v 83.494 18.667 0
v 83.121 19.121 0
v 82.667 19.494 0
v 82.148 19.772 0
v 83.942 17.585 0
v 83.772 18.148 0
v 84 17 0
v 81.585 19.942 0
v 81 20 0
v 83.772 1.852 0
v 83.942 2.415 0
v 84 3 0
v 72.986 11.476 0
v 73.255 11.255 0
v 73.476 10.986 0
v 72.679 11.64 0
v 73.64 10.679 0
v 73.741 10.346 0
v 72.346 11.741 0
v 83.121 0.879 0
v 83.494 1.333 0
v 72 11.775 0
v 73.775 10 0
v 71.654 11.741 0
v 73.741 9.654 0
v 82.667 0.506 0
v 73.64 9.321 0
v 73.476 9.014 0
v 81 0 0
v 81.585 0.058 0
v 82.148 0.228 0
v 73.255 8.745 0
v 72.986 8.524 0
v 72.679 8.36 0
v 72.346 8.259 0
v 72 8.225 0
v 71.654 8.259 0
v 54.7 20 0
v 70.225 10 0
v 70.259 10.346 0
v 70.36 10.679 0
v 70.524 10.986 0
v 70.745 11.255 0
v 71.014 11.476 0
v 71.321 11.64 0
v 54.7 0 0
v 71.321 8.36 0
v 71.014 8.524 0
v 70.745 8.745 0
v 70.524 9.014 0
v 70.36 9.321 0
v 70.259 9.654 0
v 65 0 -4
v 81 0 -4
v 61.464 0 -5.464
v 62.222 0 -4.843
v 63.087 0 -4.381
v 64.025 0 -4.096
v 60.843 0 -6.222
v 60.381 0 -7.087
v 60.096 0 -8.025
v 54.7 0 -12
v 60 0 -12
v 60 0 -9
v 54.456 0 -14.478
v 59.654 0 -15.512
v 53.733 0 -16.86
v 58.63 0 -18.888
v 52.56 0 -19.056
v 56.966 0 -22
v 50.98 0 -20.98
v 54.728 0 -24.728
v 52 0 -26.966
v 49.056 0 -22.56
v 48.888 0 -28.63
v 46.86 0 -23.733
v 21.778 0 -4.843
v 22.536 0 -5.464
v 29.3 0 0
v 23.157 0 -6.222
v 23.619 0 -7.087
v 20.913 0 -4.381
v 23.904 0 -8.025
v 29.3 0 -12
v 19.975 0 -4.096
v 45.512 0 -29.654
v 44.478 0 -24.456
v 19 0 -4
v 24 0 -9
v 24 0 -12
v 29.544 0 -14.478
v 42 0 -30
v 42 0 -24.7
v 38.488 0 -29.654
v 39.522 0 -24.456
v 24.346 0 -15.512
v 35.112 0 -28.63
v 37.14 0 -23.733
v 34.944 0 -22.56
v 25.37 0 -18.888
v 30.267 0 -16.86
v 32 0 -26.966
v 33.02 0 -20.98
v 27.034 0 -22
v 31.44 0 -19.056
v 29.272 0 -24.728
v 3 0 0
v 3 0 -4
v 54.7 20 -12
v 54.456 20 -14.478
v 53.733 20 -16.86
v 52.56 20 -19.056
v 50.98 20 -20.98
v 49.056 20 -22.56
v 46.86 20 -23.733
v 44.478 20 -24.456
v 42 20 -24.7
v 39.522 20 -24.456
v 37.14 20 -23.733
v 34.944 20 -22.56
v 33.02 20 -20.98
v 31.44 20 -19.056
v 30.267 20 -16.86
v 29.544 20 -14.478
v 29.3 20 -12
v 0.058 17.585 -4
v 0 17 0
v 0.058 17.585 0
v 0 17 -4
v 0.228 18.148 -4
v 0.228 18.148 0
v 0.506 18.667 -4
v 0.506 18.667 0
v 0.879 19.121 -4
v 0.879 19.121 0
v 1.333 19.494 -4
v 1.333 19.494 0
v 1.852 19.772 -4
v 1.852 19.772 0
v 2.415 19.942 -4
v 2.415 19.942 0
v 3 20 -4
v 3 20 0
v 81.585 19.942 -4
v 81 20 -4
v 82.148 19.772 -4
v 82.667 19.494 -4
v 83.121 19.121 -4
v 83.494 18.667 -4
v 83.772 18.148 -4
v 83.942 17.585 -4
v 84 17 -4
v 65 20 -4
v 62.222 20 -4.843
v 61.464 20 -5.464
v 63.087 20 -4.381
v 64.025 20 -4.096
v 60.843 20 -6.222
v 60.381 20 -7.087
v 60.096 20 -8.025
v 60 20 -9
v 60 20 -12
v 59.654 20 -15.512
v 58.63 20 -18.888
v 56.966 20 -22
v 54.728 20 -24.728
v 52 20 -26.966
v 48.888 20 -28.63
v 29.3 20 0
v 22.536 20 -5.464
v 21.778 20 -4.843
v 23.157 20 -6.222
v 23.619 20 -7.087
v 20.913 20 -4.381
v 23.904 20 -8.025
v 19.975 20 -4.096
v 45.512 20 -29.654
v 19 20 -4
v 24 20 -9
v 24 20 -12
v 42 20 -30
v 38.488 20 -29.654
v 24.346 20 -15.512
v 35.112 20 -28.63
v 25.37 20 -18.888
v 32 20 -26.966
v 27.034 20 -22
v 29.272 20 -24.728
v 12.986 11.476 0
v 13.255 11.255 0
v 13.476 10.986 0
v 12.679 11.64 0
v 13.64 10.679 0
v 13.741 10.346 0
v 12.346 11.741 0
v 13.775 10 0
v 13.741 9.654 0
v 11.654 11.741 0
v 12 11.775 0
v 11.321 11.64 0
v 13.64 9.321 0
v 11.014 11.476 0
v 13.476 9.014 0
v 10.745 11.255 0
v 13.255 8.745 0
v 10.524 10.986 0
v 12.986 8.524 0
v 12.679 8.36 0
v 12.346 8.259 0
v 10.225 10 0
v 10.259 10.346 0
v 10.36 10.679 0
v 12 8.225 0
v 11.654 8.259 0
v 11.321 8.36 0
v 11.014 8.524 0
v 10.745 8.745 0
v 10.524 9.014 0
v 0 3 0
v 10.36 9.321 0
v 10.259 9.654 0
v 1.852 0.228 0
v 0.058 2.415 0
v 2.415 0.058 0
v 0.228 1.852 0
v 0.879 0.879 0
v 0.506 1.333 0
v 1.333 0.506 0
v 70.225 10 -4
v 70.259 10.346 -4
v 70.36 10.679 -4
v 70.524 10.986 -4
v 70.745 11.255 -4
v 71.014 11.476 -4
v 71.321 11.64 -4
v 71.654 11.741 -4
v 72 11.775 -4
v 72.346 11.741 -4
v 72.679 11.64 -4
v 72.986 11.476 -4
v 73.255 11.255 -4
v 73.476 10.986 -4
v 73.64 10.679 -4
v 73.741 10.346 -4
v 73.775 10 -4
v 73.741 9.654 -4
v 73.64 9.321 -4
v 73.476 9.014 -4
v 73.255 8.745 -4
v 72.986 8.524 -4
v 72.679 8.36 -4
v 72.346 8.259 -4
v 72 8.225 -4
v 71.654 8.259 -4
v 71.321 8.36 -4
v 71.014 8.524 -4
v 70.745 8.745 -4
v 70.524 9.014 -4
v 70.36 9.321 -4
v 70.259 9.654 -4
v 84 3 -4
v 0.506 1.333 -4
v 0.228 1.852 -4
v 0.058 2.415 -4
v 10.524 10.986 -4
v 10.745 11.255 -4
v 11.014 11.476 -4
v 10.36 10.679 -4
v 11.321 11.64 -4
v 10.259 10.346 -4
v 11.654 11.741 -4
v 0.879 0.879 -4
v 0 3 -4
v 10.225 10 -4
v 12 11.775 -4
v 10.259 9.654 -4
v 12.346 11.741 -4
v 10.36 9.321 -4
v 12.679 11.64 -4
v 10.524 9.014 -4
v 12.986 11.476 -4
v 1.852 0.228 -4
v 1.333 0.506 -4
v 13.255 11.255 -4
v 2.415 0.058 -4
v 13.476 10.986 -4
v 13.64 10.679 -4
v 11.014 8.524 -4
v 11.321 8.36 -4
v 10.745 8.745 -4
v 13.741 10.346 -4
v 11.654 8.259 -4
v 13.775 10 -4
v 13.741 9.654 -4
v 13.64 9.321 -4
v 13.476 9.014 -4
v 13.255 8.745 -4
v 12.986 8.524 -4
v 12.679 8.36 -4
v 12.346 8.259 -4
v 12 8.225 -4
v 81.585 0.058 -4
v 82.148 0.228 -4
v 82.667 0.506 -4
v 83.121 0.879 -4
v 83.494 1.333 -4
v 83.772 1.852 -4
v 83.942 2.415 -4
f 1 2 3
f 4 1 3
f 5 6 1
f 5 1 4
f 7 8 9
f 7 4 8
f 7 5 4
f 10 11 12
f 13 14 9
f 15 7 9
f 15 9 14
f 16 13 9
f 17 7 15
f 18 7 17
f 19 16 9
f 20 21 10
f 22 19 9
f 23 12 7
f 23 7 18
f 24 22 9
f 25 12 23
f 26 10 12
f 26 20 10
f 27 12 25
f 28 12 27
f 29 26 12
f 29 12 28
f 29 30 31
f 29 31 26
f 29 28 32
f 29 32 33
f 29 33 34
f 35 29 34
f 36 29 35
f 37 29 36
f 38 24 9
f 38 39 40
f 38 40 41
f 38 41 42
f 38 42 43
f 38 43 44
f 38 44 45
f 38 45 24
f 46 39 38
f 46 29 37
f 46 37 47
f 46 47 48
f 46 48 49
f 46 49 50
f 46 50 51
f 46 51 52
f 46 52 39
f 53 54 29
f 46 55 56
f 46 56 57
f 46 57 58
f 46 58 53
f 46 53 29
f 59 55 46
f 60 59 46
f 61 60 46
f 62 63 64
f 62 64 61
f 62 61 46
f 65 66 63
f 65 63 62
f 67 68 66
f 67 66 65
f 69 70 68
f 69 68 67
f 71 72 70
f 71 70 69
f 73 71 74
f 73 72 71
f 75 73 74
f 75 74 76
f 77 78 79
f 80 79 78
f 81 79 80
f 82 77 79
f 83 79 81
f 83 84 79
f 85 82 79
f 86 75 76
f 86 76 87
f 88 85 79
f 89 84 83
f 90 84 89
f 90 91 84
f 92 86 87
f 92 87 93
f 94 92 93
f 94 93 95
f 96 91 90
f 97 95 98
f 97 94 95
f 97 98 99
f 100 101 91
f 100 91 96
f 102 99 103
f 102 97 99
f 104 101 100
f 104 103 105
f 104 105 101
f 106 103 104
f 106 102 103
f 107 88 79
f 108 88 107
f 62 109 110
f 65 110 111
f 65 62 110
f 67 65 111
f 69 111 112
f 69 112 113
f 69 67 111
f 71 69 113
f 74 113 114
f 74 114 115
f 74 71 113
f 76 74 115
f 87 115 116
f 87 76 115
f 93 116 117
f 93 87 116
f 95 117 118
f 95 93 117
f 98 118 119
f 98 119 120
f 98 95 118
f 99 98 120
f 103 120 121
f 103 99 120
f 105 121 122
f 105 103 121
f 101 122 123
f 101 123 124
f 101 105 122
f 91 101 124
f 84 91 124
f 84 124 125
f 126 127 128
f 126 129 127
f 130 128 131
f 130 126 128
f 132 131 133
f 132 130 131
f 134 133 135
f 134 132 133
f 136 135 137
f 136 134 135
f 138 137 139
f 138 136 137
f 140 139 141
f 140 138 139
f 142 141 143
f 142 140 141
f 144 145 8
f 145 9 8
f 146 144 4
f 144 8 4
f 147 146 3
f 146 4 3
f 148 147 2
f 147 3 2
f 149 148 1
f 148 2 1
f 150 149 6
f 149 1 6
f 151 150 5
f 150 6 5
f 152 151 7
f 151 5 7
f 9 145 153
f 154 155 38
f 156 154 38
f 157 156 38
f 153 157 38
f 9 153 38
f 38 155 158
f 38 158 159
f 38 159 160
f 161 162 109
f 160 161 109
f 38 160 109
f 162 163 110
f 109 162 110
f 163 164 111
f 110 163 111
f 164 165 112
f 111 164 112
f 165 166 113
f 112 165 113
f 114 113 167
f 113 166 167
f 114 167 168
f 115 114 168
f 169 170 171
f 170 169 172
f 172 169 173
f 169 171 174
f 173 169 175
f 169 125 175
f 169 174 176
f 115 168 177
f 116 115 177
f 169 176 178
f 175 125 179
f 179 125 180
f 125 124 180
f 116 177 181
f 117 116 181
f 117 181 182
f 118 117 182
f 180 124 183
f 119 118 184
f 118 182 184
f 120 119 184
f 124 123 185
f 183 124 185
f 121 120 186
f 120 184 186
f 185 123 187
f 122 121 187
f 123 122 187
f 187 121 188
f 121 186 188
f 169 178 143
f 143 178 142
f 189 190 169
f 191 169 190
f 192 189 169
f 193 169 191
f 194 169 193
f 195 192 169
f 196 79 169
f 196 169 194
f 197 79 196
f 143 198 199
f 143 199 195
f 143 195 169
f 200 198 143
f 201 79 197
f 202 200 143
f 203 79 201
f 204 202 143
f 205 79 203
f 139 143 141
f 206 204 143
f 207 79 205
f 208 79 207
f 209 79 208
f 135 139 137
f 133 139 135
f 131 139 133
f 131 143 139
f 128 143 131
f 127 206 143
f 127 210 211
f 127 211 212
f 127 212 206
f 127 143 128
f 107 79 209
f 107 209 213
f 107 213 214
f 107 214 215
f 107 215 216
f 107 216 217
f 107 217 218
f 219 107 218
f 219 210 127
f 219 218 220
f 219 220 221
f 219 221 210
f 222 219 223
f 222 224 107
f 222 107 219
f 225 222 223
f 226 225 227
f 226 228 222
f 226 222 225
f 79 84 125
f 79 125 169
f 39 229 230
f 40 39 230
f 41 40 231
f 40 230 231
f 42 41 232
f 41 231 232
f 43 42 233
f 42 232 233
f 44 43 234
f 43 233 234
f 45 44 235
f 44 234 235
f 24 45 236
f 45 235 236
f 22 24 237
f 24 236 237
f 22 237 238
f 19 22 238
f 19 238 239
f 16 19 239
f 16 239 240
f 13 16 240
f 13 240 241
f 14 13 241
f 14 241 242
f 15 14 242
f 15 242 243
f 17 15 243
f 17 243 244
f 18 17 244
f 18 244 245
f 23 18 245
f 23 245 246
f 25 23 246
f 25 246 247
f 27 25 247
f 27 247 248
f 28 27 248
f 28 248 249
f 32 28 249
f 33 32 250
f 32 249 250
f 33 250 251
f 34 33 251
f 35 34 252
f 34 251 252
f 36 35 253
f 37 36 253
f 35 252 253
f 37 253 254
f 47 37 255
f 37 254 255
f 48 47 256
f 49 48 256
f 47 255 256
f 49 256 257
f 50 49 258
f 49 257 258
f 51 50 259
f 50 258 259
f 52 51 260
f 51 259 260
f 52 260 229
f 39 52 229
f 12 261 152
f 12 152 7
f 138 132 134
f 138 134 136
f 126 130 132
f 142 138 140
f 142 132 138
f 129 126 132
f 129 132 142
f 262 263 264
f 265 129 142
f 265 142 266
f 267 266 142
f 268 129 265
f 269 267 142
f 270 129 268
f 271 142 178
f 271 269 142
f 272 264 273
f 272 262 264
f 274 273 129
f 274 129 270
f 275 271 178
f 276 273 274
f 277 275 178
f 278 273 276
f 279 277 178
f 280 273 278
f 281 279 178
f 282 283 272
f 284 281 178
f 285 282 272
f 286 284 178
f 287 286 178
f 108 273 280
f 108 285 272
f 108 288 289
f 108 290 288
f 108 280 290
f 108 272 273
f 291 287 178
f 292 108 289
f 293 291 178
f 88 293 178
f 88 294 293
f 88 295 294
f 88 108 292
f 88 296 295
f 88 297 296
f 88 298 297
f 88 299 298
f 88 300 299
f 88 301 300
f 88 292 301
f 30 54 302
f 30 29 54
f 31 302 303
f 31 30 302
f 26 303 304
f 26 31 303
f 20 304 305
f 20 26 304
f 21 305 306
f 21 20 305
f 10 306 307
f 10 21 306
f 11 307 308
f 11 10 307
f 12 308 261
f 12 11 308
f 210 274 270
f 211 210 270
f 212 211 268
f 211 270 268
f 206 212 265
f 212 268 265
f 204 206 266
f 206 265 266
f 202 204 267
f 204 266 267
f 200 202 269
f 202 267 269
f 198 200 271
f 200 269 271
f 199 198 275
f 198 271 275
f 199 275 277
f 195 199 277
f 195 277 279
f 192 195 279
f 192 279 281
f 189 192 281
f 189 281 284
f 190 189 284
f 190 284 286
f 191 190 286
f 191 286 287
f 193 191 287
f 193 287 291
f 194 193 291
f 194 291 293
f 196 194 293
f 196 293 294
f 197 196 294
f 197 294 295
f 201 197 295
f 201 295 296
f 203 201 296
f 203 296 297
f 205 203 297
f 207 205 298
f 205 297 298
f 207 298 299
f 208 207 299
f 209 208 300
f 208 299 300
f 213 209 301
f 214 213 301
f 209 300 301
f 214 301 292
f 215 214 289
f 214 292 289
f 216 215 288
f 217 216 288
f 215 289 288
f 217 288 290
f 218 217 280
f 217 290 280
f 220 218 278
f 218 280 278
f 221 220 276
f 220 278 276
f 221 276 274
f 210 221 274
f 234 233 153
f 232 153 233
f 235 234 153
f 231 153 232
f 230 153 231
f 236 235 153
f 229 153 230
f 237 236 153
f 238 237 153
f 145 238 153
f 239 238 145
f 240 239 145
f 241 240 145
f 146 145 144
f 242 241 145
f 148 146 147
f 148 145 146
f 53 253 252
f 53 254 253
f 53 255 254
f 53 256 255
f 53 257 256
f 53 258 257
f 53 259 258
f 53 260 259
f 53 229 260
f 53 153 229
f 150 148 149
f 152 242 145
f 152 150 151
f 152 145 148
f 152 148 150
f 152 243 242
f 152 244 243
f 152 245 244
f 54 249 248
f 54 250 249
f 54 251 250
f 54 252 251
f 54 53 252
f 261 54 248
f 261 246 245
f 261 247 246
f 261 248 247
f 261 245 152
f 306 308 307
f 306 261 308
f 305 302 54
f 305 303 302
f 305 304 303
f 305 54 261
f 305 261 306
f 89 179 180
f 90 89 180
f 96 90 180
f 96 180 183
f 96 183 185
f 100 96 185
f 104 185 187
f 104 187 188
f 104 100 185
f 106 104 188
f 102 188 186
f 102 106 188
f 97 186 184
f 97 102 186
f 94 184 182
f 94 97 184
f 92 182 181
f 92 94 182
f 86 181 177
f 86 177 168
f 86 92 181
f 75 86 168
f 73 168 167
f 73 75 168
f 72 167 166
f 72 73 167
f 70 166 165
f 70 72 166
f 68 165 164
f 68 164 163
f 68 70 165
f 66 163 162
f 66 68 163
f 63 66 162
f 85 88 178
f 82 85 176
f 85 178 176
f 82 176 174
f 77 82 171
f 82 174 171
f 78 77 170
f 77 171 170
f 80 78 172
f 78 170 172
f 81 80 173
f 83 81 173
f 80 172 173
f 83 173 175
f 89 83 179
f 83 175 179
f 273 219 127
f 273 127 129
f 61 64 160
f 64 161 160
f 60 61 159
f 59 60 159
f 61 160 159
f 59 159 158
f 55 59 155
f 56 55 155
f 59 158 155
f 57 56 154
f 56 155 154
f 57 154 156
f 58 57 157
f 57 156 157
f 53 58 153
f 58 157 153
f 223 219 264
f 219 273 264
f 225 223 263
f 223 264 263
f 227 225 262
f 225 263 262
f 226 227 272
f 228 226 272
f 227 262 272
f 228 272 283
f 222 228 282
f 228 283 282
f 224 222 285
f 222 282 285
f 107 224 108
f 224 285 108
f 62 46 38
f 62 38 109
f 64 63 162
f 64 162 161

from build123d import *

# Parameters (mm, degrees)
BOSS_EXTRUDE1_DEPTH = 20
SKETCH2_R           = 1.775
CUT_EXTRUDE1_DEPTH  = 5
FILLET1_R           = 3
FILLET2_R           = 5


with BuildPart() as part:
    # Sketch1 → Boss-Extrude1 (new body)
    with BuildSketch(Plane(origin=(0, 0, 0), x_dir=(1, 0, 0), z_dir=(0, 1, 0))):
        with BuildLine():
            Line((0, 0), (0, 4))
            Line((0, 4), (24, 4))
            Line((24, 4), (24, 12))
            ThreePointArc((24, 12), (42, 30), (60, 12))
            Line((60, 12), (60, 4))
            Line((60, 4), (84, 4))
            Line((84, 4), (84, 0))
            Line((84, 0), (54.7, 0))
            Line((54.7, 0), (54.7, 12))
            ThreePointArc((54.7, 12), (42, 24.7), (29.3, 12))
            Line((29.3, 12), (29.3, 0))
            Line((29.3, 0), (0, 0))
        make_face()
    extrude(amount=BOSS_EXTRUDE1_DEPTH)

    # Sketch2 → Cut-Extrude1 (cut, through all)
    with BuildSketch(Plane(origin=(0, 0, -4), x_dir=(-1, 0, 0), z_dir=(0, 0, -1))):
        with Locations((-72, 10)):
            Circle(SKETCH2_R)
        with Locations((-12, 10)):
            Circle(SKETCH2_R)
    extrude(amount=-CUT_EXTRUDE1_DEPTH, mode=Mode.SUBTRACT)

    # Fillet1
    fillet1_edges = [part.edges().sort_by_distance(p)[0] for p in [
        (0, 0, -2),
        (84, 0, -2),
        (84, 20, -2),
        (0, 20, -2),
    ]]
    fillet(fillet1_edges, radius=FILLET1_R)

    # Fillet2
    fillet2_edges = [part.edges().sort_by_distance(p)[0] for p in [
        (24, 10, -4),
        (60, 10, -4),
    ]]
    fillet(fillet2_edges, radius=FILLET2_R)


solid = part.part
